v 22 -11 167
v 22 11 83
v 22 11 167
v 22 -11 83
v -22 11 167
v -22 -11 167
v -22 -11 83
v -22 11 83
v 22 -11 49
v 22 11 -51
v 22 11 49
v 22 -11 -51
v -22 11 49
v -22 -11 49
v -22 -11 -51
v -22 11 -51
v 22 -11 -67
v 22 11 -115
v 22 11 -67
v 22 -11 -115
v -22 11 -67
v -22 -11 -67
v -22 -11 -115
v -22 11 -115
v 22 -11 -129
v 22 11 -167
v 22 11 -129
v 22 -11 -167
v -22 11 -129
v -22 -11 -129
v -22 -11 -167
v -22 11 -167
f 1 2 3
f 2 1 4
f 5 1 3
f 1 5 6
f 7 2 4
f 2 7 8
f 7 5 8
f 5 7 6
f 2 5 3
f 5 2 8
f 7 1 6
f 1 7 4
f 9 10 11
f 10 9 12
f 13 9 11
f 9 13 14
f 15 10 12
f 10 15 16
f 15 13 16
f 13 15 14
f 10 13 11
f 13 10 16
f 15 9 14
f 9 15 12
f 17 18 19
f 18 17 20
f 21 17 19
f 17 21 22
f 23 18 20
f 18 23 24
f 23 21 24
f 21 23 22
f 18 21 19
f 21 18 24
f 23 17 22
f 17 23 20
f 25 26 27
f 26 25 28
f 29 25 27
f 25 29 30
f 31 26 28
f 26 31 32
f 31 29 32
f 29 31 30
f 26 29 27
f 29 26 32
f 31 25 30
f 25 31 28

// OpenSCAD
// ============================================================================
// Atom Lithography Machine — Parametric OpenSCAD Module (S6.6-04)
// ============================================================================
// part_id           : S6.6-04
// parent_bom_id     : S6.6
// subsystem         : S6
// part_name         : Cikis superiletken NbTi / SS koaksiyel hatlari (56 zincir, Exp114)
// material          : NbTi
// temp_stage        : 20 mK -> 300 K
// vacuum_grade      : Kriyo-vakum
// tolerance         : <0.1 dB/m
// computed_mass_kg  : 0.51215
// envelope_mm       : 44.000 x 22.000 x 334.000
// design_maturity   : M0_M1_DETAILED_CAD_DESIGN_ONLY
// no_lab_measurement: true
// iec61508_certified: false
// semi_s2_certified : false
// Units: millimeters (mm)
// ============================================================================

$fn = 64;

// Nominal bounding envelope parameters (mm)
bbox_x = 44.0000;
bbox_y = 22.0000;
bbox_z = 334.0000;

// Part-specific parametric dimensions
n_chains = 56;
loss_db_per_m = 0.1;
superconducting_span = "MXC_to_4K";

// Interface / port parameters (mm)

module part_S6_6_04() {
  union() {
    // Stage 50k_4k thermalized cryo coax loom (56 lines)
    translate([0.000, 0.000, 125.000]) cube([44.000, 22.000, 84.000], center=true);
    // Stage 4k_still thermalized cryo coax loom (56 lines)
    translate([0.000, 0.000, -1.000]) cube([44.000, 22.000, 100.000], center=true);
    // Stage still_cp thermalized cryo coax loom (56 lines)
    translate([0.000, 0.000, -91.000]) cube([44.000, 22.000, 48.000], center=true);
    // Stage cp_mxc thermalized cryo coax loom (56 lines)
    translate([0.000, 0.000, -148.000]) cube([44.000, 22.000, 38.000], center=true);
  }
}

// World assembly mounting transform (global machine frame, mm / deg):
// translate([-650.000, -76.000, 669.000]) rotate([0.000, 0.000, 0.000]) part_S6_6_04();

part_S6_6_04();
